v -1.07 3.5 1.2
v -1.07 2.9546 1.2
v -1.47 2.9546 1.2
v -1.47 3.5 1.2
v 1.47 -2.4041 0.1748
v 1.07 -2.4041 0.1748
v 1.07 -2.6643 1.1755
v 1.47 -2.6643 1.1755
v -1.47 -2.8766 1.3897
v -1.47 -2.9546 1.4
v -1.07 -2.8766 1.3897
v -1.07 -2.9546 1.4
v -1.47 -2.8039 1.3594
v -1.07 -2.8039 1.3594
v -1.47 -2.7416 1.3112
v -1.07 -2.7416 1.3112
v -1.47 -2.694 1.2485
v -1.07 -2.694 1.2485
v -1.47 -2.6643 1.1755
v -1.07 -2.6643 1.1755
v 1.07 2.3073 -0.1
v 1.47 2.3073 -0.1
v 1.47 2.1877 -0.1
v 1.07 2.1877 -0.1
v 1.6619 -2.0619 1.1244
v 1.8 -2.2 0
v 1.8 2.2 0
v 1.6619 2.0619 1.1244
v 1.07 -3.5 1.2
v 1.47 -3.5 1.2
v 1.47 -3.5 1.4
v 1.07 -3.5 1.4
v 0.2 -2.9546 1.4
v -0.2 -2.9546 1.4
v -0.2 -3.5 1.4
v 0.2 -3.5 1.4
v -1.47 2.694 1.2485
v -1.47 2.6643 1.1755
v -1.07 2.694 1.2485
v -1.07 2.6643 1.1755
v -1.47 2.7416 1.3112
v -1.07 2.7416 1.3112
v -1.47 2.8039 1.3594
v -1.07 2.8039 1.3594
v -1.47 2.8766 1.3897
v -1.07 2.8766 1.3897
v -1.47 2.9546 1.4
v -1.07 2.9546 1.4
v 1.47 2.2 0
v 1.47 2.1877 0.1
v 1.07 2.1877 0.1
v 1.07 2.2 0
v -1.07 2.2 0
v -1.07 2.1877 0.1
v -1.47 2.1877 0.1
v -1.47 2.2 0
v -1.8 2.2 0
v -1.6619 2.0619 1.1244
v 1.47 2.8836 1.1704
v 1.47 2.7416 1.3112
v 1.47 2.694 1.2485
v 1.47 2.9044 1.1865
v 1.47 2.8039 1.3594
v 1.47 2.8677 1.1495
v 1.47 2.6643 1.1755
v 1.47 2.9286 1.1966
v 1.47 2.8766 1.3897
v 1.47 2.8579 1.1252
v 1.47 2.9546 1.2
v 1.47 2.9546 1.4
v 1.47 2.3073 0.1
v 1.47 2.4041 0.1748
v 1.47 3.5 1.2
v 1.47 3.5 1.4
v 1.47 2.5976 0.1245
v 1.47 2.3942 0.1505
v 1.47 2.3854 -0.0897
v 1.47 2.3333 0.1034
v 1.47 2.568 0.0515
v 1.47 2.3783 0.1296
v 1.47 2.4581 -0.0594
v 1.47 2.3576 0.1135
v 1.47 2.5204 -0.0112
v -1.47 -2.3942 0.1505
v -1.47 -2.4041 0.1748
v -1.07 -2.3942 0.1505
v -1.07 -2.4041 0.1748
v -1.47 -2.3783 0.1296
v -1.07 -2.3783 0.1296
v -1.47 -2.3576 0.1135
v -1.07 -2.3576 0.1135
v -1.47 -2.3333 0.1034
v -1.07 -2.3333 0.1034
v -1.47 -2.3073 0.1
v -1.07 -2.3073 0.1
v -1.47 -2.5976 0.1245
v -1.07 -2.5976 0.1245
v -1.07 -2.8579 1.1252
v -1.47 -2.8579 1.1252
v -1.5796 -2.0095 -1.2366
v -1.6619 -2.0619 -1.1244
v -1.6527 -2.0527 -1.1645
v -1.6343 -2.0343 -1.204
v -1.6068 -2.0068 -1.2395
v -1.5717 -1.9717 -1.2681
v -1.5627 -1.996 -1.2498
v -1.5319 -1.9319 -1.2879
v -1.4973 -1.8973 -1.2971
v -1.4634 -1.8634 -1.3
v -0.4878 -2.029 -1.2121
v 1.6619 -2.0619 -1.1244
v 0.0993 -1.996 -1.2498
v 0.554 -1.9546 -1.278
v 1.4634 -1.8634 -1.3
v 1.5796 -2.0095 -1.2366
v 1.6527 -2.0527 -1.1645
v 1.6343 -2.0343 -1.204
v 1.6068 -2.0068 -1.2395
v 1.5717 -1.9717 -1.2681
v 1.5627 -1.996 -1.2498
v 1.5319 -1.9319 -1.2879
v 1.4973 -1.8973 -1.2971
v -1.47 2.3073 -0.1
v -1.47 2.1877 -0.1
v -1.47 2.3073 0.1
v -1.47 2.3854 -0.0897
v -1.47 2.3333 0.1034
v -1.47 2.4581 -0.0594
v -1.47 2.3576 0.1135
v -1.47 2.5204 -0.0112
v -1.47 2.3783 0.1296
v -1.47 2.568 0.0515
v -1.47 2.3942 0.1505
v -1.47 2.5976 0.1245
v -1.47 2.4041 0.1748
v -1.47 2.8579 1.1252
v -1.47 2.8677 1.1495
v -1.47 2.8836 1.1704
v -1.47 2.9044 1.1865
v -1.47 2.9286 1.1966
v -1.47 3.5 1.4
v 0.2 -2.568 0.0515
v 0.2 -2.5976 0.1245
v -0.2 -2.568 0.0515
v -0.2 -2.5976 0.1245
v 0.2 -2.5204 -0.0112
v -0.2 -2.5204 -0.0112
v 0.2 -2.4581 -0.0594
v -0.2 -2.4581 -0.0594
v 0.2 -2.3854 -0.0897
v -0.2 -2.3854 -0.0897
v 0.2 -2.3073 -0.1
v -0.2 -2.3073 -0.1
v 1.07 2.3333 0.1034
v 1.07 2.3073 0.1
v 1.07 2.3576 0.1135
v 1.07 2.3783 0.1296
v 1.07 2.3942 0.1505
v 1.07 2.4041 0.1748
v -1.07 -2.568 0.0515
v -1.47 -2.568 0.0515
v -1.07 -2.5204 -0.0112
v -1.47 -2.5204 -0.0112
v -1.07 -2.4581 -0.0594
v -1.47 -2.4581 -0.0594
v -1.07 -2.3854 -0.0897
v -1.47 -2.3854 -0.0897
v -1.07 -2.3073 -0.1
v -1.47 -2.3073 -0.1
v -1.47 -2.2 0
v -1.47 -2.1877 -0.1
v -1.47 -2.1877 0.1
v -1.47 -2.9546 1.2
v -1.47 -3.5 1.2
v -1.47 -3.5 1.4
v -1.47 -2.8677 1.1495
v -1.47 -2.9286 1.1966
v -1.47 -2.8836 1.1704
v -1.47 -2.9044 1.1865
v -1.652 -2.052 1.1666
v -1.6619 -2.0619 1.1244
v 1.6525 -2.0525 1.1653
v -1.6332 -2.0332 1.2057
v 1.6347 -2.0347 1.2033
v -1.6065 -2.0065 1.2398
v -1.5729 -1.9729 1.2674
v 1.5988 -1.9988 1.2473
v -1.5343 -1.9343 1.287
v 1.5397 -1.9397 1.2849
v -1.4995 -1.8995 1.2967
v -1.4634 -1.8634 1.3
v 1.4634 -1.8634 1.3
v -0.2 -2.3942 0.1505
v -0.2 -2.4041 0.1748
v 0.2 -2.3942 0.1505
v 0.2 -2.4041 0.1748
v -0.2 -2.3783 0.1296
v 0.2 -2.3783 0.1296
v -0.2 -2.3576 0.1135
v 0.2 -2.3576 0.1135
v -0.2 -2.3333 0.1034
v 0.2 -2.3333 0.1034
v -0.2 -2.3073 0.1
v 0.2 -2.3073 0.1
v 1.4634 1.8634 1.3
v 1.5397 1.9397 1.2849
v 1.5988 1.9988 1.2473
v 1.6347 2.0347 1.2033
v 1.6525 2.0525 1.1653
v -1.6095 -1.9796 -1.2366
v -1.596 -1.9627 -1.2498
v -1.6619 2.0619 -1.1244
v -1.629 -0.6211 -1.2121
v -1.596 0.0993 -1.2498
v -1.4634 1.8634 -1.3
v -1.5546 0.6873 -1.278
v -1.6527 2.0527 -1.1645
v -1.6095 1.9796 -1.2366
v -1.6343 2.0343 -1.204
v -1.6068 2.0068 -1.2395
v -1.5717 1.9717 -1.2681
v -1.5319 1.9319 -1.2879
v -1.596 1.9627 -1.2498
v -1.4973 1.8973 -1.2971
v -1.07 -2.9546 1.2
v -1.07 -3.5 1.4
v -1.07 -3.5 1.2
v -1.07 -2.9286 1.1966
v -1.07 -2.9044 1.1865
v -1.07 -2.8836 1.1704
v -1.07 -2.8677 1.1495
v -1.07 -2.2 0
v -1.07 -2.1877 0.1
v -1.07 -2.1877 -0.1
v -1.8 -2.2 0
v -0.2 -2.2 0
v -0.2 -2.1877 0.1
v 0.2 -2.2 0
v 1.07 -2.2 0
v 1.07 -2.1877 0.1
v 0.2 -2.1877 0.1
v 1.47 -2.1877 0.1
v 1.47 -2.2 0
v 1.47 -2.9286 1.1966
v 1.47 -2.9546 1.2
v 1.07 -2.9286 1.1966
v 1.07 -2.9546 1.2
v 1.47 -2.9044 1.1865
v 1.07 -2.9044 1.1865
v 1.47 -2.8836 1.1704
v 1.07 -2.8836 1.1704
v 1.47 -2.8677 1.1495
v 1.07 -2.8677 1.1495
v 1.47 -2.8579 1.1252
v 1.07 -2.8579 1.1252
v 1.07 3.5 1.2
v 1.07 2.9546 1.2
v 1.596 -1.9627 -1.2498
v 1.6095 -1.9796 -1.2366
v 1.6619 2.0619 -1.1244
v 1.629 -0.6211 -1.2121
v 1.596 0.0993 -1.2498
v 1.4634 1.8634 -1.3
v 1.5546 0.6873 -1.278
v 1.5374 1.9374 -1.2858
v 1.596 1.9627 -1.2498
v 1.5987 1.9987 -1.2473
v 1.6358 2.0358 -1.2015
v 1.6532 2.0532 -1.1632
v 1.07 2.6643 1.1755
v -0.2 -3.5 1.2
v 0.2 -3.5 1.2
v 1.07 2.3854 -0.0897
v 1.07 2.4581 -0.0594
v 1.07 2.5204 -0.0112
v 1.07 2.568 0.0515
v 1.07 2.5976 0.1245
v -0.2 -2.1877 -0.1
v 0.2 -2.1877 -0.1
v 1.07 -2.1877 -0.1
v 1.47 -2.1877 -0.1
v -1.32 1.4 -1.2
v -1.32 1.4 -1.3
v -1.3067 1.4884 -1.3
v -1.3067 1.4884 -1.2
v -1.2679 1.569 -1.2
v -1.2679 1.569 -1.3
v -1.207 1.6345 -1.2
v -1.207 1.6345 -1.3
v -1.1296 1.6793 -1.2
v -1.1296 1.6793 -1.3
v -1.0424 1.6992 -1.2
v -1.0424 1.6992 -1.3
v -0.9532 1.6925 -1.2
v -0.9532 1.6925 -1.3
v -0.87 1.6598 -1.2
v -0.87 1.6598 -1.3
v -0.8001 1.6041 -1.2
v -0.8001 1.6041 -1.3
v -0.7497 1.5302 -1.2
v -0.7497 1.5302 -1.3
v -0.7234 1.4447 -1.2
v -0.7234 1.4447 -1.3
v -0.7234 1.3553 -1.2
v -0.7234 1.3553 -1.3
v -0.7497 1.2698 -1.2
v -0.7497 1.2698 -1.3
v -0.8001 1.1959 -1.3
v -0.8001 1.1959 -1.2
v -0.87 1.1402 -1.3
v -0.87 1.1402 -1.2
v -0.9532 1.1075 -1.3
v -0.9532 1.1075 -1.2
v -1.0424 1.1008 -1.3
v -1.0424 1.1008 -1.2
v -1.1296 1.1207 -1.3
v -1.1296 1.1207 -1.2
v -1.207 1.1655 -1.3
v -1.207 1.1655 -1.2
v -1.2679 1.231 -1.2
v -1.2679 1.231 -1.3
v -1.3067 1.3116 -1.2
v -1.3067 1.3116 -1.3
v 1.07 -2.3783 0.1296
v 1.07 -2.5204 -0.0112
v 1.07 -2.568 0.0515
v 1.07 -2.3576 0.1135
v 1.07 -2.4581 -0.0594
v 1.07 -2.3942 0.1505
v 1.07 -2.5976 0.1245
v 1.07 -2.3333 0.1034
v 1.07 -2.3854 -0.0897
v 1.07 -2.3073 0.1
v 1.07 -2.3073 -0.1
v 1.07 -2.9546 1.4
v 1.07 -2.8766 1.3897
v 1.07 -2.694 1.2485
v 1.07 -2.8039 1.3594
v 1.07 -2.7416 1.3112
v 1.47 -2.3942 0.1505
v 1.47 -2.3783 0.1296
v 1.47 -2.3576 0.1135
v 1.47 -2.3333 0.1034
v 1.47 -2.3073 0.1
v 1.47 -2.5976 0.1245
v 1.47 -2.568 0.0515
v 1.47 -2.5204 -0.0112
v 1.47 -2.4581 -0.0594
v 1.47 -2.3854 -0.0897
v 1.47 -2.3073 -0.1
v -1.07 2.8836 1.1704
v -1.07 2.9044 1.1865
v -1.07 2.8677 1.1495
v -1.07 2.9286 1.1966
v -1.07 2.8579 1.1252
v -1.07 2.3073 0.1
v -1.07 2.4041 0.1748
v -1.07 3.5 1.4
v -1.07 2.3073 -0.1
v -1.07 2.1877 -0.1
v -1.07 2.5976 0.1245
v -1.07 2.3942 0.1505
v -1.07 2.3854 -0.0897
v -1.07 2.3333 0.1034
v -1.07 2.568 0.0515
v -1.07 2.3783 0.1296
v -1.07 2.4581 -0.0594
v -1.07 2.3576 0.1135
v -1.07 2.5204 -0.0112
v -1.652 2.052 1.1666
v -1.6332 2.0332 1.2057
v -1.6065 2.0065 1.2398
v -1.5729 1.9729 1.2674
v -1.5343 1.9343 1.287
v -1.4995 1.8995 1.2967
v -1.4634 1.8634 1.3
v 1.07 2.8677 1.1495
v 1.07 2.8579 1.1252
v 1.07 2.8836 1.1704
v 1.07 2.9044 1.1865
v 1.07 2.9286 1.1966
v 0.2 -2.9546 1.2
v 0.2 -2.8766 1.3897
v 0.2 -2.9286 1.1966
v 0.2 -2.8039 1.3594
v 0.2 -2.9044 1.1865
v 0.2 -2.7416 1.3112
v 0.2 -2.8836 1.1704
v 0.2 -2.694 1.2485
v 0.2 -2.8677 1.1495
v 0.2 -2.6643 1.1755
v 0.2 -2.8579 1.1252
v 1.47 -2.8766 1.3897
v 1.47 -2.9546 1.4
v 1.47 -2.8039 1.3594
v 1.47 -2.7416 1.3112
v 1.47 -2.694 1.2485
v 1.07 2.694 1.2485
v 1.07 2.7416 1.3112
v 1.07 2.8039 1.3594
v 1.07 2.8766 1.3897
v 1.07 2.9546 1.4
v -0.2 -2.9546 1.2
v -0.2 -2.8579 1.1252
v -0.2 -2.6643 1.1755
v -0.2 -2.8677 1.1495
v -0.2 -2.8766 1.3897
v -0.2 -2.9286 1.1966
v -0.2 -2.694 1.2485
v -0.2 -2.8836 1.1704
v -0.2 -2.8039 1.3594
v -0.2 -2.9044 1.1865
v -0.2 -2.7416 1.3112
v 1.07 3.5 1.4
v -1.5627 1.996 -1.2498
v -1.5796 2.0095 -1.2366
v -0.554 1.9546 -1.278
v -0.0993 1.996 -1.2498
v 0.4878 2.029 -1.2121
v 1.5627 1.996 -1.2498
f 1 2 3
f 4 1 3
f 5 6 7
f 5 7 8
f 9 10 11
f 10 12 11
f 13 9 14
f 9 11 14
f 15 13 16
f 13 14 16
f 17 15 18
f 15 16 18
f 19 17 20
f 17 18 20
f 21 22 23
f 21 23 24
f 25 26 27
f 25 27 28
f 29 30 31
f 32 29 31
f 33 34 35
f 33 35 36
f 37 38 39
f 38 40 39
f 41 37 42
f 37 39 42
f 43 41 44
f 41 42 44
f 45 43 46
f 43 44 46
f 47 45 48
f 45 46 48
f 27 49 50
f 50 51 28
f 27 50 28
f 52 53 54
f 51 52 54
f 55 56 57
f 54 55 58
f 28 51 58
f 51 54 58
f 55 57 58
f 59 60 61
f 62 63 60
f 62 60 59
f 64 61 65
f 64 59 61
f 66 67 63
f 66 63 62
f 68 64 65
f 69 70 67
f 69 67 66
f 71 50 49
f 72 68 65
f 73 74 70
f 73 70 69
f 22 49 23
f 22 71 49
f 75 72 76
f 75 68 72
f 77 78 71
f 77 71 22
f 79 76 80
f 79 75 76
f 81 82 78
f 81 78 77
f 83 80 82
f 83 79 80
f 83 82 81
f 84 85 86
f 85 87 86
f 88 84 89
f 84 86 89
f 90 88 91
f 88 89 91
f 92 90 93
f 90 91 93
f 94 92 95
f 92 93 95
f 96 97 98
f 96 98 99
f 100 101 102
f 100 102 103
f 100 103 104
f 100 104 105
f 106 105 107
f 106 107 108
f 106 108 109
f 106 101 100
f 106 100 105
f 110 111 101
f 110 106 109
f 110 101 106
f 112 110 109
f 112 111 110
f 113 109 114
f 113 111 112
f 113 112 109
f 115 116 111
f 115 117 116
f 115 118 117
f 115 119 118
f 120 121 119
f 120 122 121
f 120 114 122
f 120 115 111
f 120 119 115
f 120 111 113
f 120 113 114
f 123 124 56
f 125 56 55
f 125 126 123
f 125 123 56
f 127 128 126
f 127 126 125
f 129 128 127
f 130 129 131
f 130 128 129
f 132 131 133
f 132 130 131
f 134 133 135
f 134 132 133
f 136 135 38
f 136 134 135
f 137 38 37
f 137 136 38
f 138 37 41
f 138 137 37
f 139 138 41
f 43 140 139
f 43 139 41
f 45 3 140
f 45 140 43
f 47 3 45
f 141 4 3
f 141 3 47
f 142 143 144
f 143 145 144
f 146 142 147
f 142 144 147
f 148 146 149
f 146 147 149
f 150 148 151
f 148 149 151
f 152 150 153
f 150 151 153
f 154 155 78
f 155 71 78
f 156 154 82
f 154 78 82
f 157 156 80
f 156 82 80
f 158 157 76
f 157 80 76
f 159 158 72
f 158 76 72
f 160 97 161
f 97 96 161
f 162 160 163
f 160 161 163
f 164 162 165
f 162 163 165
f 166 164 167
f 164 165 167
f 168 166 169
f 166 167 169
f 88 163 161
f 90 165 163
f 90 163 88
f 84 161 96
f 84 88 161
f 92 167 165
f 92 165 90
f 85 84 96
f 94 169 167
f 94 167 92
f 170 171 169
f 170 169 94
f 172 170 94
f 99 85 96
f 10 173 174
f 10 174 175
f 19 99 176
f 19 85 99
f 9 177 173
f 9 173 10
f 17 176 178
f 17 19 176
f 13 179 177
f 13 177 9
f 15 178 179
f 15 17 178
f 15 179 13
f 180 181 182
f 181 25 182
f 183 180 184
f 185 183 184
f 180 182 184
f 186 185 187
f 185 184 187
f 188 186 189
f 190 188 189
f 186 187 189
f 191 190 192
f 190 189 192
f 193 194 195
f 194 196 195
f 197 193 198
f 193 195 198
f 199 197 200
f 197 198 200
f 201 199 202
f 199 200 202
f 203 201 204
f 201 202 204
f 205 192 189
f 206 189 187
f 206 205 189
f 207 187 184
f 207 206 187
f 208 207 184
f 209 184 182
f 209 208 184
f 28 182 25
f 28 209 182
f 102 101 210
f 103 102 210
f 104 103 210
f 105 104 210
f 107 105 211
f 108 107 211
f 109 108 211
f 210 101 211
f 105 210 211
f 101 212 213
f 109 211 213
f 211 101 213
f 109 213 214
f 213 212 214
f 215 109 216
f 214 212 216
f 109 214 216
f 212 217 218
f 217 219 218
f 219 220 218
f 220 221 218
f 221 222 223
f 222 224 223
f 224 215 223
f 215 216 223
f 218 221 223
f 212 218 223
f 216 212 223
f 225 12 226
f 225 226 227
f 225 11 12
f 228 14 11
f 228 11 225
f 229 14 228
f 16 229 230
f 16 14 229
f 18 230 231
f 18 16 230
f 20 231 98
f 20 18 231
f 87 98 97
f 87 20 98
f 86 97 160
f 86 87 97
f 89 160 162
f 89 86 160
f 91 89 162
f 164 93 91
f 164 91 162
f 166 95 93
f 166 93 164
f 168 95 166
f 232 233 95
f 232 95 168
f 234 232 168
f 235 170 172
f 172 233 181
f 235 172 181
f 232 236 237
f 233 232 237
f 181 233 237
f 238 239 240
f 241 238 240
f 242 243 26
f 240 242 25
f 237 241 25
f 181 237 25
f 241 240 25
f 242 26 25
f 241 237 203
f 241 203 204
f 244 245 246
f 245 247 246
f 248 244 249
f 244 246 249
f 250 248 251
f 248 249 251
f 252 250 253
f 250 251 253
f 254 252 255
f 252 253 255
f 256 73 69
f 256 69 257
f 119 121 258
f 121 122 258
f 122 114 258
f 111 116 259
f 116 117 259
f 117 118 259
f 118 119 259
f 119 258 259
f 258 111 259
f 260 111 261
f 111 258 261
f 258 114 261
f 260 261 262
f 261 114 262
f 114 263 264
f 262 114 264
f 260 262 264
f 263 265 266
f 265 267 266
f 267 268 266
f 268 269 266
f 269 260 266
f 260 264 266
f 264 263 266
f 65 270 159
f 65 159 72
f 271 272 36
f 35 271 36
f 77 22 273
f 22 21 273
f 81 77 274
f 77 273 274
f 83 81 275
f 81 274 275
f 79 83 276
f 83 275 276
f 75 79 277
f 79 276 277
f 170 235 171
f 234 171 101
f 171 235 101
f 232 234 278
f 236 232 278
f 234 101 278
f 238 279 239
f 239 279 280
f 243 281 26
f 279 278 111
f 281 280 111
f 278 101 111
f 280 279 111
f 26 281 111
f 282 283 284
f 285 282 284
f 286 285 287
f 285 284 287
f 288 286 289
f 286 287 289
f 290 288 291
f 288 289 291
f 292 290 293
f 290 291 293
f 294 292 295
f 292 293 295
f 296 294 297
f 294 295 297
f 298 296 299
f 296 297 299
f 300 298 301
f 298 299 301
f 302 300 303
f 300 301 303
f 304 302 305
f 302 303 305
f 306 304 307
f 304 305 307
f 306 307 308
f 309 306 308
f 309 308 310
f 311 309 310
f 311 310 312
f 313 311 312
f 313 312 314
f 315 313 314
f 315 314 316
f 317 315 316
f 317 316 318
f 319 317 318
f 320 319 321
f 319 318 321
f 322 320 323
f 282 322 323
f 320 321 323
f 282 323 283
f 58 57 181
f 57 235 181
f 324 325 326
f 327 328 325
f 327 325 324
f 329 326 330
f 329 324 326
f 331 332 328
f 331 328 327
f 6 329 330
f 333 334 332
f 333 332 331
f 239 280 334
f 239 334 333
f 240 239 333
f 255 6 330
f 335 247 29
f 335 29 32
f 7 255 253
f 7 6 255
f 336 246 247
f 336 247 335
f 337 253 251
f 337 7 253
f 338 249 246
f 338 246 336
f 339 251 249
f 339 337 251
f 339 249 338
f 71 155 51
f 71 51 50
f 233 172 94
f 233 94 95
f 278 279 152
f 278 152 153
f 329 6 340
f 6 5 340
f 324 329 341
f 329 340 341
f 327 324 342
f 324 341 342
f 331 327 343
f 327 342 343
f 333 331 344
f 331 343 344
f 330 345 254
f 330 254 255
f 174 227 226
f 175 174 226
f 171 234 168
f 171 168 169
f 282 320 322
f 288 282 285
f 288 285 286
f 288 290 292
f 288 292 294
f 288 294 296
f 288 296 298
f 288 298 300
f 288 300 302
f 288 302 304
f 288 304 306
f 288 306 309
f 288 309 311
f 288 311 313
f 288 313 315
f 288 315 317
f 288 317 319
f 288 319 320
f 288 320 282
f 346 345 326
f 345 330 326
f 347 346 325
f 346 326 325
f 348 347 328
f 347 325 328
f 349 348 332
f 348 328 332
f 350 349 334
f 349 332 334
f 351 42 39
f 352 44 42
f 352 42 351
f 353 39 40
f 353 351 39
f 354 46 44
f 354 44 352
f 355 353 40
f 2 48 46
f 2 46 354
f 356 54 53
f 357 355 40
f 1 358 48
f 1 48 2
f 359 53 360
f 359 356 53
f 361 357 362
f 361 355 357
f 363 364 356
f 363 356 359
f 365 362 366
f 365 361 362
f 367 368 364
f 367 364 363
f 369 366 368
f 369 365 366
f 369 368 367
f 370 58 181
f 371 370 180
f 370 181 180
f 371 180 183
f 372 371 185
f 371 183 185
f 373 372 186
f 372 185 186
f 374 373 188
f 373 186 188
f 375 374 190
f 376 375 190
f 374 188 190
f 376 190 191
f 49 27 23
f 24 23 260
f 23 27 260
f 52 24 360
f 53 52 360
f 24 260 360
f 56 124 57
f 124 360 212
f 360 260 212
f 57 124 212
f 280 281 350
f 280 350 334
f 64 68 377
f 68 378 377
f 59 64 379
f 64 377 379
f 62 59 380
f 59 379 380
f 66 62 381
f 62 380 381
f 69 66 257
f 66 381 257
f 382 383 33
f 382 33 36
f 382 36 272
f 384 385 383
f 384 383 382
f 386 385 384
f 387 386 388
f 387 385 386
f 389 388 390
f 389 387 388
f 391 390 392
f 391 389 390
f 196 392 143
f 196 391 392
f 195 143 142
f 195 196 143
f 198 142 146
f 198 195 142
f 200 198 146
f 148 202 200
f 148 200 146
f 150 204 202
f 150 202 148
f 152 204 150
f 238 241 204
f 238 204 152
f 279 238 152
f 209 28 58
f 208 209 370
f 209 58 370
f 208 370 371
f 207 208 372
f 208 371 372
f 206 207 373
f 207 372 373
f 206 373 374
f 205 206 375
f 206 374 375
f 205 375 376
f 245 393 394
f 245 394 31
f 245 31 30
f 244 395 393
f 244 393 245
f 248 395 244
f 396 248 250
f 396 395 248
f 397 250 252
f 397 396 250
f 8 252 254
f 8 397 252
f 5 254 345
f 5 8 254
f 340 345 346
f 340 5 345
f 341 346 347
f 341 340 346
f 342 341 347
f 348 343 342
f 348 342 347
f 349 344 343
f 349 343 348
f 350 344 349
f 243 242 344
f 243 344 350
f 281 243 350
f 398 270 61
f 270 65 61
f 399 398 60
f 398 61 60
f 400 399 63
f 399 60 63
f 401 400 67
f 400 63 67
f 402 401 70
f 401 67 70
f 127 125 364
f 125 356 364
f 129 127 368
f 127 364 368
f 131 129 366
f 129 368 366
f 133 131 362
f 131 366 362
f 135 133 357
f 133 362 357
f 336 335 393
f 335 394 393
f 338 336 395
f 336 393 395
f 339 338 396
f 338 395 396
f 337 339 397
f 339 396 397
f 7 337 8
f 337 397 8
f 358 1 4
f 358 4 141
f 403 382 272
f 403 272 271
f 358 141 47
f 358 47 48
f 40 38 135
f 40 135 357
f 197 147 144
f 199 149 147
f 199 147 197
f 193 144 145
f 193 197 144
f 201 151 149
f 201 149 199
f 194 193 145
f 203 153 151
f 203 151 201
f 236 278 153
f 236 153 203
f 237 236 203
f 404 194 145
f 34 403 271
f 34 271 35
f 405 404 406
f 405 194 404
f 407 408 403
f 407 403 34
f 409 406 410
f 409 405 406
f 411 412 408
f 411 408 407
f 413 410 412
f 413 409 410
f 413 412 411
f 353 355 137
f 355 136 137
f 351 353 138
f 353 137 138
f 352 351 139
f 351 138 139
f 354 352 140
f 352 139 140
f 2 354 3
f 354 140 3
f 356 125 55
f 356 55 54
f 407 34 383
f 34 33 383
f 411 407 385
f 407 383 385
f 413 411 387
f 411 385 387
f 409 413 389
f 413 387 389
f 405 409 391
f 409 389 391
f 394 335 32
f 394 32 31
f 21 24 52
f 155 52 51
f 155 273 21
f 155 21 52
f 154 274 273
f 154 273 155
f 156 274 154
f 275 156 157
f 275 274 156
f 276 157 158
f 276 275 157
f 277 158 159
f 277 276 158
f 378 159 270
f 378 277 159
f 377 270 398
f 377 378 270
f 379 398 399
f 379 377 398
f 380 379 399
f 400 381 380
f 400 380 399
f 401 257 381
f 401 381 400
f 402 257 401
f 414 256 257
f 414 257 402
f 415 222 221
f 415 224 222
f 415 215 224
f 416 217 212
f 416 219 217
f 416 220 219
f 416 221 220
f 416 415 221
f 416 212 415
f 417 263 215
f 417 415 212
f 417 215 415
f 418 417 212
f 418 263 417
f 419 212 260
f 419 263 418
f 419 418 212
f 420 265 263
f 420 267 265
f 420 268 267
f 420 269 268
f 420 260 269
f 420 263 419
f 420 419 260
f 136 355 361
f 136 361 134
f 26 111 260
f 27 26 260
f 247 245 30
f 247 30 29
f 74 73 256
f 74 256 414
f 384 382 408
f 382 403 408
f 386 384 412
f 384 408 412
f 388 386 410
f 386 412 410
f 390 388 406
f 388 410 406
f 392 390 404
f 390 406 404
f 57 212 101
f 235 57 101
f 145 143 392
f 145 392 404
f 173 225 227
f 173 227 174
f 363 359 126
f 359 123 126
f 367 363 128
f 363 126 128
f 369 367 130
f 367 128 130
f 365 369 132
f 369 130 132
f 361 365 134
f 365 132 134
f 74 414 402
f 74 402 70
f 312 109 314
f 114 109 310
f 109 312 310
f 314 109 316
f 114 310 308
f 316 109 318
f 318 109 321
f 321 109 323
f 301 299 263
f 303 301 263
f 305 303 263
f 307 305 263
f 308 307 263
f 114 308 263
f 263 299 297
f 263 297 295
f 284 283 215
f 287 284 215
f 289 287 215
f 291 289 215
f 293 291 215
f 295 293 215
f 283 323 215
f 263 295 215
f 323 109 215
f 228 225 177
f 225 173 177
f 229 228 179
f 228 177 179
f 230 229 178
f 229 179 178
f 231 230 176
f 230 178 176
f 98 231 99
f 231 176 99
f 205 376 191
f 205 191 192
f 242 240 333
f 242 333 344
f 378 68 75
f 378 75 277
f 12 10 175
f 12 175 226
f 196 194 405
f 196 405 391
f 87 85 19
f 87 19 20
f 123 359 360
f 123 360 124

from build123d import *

# Parameters (mm, degrees)
SKETCH1_W                = 3.6
SKETCH1_H                = 4.4
EXTRUDE1_DEPTH           = 1.3
EXTRUDE1_TAPER           = 7
EXTRUDE1_OTHER_WAY_DEPTH = 1.3
EXTRUDE1_OTHER_WAY_TAPER = 7
FILLET1_R                = 0.2
SKETCH3_W                = 0.4
SKETCH3_H                = 0.2
SKETCH7_R                = 0.3
EXTRUDE2_DEPTH           = 0.1
SKETCH5_W                = 0.4
SKETCH5_H                = 0.2


with BuildPart() as part:
    # Sketch1 → Extrude1 (new body)
    with BuildSketch(Plane.XY):
        Rectangle(SKETCH1_W, SKETCH1_H)
    extrude(amount=EXTRUDE1_DEPTH, taper=EXTRUDE1_TAPER)

    # Sketch1 → Extrude1 other way (add)
    with BuildSketch(Plane.XY):
        Rectangle(SKETCH1_W, SKETCH1_H)
    extrude(amount=-EXTRUDE1_OTHER_WAY_DEPTH, taper=EXTRUDE1_OTHER_WAY_TAPER)

    # Fillet1
    fillet1_edges = [part.edges().sort_by_distance(p)[0] for p in [
        (-1.640380071, 0, -1.3),
        (0, -2.040380071, -1.3),
        (1.640380071, 0, 1.3),
        (0, 2.040380071, 1.3),
        (-1.640380071, 0, 1.3),
        (0, -2.040380071, 1.3),
        (1.640380071, 0, -1.3),
        (0, 2.040380071, -1.3),
    ]]
    fillet(fillet1_edges, radius=FILLET1_R)

    # Sweep4: sweep along a path in Sketch4
    with BuildLine(Plane(origin=(0, 0, 0), x_dir=(0, 0, -1), z_dir=(1, 0, 0))) as sweep4_path:
        Line((0, 2.061944248), (0, 2.307301205))
        ThreePointArc((0, 2.307301205), (-0.04178036, 2.429639038), (-0.149665454, 2.500863685))
        Line((-0.149665454, 2.500863685), (-1.150334546, 2.761080563))
        ThreePointArc((-1.150334546, 2.761080563), (-1.25821964, 2.83230521), (-1.3, 2.954643043))
        Line((-1.3, 2.954643043), (-1.3, 3.5))
    # Sketch3 → Sweep4 (sweep)
    with BuildSketch(Plane(origin=(0, 2.061944248, 0), x_dir=(-1, 0, 0), z_dir=(0, 1, 0))):
        with Locations((1.27, 0)):
            Rectangle(SKETCH3_W, SKETCH3_H)
        with Locations((-1.27, 0)):
            Rectangle(SKETCH3_W, SKETCH3_H)
    sweep(path=sweep4_path.line)

    # Sketch7 → Extrude2 (cut)
    with BuildSketch(Plane(origin=(0, 0, -1.3), x_dir=(-1, 0, 0), z_dir=(0, 0, -1))):
        with Locations((1.02, 1.4)):
            Circle(SKETCH7_R)
    extrude(amount=-EXTRUDE2_DEPTH, mode=Mode.SUBTRACT)

    # Sweep3: sweep along a path in Sketch8
    with BuildLine(Plane(origin=(0, 0, 0), x_dir=(0, 0, -1), z_dir=(1, 0, 0))) as sweep3_path:
        Line((-1.3, -3.5), (-1.3, -2.954643043))
        ThreePointArc((-1.3, -2.954643043), (-1.25821964, -2.83230521), (-1.150334546, -2.761080563))
        Line((-1.150334546, -2.761080563), (-0.149665454, -2.500863685))
        ThreePointArc((-0.149665454, -2.500863685), (-0.04178036, -2.429639038), (0, -2.307301205))
        Line((0, -2.307301205), (0, -2.061944248))
    # Sketch5 → Sweep3 (sweep)
    with BuildSketch(Plane(origin=(0, -2.061944248, 0), x_dir=(-1, 0, 0), z_dir=(0, 1, 0))):
        with Locations((1.27, 0)):
            Rectangle(SKETCH5_W, SKETCH5_H)
        Rectangle(SKETCH5_W, SKETCH5_H)
        with Locations((-1.27, 0)):
            Rectangle(SKETCH5_W, SKETCH5_H)
    sweep(path=sweep3_path.line)


solid = part.part
